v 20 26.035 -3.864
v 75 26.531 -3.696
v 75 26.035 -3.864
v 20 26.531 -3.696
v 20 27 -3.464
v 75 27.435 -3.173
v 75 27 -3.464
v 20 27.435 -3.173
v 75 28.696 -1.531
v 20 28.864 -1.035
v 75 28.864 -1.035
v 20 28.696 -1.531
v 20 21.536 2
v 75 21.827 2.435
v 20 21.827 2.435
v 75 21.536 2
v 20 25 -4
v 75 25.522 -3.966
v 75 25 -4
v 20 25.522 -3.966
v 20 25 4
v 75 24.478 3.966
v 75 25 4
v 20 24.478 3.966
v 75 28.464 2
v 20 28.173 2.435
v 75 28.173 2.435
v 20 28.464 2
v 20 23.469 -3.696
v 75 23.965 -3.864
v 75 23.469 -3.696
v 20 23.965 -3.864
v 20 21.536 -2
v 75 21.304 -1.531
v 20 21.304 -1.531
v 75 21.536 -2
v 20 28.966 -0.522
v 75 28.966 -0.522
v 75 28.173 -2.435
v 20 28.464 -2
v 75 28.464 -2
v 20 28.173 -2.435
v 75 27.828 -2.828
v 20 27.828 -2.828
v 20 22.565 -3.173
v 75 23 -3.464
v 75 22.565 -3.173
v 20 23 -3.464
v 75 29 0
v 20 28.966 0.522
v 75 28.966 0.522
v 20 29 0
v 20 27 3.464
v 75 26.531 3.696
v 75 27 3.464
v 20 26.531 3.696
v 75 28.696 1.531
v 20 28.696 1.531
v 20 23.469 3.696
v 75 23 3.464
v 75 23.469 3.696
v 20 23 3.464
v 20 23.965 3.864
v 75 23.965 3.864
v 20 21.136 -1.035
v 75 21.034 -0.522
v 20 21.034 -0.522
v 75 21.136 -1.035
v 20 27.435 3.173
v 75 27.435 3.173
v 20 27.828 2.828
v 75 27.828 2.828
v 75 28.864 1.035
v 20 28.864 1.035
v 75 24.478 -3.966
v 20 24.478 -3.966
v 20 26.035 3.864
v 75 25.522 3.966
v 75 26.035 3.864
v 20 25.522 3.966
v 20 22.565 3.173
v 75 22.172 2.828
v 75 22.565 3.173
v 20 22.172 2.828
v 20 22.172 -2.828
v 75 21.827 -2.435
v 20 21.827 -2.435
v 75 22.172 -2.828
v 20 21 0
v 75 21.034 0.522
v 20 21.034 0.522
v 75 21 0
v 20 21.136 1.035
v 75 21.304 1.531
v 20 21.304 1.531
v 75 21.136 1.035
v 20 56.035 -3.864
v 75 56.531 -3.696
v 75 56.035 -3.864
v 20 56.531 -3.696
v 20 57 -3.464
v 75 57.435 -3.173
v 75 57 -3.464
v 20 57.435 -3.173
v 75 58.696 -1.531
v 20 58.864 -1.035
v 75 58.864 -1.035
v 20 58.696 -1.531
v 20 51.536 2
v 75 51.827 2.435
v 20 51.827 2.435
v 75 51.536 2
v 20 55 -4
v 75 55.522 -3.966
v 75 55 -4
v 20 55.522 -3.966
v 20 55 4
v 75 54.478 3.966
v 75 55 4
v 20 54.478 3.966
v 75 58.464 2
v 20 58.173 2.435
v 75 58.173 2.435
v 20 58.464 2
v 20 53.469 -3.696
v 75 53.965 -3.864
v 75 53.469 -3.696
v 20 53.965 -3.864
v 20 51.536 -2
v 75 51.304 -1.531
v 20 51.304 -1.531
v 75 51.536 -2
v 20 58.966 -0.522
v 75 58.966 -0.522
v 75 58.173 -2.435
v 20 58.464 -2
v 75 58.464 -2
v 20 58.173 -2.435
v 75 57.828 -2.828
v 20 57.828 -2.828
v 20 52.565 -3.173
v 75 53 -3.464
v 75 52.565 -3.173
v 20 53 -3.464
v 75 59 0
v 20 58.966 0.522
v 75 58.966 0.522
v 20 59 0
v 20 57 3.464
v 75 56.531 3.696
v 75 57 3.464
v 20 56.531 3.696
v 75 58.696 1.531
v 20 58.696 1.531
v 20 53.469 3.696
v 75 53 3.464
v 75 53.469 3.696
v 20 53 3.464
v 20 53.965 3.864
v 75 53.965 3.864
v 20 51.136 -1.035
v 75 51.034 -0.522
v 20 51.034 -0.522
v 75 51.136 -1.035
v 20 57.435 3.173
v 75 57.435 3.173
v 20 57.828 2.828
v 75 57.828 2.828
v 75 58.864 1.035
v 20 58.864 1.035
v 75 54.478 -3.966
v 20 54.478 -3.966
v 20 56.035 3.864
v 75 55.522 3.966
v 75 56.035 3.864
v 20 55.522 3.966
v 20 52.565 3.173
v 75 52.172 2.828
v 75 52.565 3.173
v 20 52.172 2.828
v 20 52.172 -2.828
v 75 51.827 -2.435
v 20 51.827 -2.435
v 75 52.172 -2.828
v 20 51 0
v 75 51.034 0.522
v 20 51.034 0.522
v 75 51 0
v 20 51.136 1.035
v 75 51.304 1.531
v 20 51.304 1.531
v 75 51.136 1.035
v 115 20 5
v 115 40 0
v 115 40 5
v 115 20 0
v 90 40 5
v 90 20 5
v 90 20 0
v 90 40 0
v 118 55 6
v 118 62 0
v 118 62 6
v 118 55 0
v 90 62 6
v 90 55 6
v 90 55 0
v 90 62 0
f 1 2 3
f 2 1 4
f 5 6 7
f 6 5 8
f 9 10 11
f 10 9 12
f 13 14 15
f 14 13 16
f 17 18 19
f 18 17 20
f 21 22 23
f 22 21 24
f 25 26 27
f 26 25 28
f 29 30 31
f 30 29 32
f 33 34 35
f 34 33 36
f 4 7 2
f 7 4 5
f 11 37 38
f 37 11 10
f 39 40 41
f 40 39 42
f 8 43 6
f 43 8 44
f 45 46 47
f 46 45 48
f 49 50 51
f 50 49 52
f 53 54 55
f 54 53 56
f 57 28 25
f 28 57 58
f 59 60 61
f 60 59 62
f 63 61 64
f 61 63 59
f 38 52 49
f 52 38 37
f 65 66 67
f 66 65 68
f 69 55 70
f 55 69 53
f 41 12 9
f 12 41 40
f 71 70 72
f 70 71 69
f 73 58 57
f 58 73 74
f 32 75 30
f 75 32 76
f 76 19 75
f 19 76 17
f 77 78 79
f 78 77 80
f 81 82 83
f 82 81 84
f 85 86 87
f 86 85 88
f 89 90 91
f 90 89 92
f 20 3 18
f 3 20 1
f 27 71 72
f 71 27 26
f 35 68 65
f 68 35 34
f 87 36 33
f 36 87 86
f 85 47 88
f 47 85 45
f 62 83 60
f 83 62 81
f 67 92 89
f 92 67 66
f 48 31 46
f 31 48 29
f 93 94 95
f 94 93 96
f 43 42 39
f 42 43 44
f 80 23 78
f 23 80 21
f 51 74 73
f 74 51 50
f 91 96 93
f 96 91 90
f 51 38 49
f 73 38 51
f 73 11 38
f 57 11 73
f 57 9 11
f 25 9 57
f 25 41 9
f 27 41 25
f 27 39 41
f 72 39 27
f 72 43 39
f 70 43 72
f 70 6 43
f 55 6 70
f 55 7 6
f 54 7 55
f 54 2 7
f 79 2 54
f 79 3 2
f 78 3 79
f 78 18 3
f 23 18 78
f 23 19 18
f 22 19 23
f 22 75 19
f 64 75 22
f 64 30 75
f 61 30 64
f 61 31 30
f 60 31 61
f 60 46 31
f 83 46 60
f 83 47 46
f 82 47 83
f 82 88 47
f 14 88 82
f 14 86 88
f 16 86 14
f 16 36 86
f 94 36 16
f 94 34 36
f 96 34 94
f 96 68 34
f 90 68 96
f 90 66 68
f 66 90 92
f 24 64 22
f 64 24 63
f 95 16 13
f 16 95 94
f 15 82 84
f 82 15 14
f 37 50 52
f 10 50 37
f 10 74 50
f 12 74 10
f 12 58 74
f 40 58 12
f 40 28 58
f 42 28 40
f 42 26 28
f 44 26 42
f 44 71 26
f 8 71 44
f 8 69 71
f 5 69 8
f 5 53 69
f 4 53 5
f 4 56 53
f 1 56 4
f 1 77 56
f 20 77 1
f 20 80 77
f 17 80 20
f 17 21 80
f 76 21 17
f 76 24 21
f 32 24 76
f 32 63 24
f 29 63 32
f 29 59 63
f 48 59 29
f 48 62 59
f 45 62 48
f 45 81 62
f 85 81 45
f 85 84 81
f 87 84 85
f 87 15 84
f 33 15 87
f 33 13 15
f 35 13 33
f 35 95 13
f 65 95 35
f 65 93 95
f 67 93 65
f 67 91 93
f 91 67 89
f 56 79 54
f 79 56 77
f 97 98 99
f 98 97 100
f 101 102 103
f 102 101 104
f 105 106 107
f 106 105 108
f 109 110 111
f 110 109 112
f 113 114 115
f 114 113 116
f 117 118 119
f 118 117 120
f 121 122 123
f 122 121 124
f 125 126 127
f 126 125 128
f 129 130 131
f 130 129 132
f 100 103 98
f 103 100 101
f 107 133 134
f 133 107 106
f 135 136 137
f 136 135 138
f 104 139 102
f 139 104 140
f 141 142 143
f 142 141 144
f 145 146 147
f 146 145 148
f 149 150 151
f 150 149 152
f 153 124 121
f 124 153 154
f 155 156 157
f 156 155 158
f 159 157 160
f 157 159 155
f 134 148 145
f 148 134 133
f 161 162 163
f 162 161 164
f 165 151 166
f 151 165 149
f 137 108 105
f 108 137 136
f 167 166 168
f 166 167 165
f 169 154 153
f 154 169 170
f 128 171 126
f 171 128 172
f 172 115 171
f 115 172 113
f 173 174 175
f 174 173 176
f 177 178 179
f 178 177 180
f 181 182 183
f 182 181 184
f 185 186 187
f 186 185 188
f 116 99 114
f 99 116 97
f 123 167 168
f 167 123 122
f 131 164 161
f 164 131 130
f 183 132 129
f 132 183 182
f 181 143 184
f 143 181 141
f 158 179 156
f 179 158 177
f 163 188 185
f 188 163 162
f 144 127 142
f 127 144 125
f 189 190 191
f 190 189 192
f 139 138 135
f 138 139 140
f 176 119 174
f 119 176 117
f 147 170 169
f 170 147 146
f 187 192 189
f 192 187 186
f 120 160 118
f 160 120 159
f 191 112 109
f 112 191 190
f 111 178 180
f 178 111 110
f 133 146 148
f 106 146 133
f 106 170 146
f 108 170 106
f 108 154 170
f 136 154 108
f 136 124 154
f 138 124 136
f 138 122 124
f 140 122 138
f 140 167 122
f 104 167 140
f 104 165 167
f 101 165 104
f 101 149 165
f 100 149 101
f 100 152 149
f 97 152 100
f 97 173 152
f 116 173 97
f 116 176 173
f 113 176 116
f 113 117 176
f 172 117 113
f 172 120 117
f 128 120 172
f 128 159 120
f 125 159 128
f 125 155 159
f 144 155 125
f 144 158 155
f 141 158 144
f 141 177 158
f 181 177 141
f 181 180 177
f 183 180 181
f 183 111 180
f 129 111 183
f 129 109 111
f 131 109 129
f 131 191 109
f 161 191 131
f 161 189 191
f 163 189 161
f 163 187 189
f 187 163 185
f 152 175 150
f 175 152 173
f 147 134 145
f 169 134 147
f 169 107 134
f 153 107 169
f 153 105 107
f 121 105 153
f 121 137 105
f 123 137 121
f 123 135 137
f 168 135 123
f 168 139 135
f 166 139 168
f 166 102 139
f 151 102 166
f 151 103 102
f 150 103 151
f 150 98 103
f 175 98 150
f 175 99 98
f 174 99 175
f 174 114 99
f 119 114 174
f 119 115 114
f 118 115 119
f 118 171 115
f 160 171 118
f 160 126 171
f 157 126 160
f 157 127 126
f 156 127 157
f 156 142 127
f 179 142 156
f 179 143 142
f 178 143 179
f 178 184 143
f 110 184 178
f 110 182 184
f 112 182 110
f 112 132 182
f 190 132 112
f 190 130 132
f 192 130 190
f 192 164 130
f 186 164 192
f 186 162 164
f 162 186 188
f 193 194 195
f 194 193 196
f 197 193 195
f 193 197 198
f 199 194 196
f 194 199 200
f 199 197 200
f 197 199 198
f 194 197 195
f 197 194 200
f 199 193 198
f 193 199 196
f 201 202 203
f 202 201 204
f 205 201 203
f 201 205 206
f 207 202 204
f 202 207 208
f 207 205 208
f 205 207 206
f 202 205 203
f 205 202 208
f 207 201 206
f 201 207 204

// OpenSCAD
$fn=48;for(y=[25,55])color([.55,.55,.55])translate([20,y,0])rotate([0,90,0])cylinder(h=55,r=4);color([.05,.4,.3])translate([90,20,0])cube([25,20,5]);color([.95,.95,.95])translate([90,55,0])cube([28,7,6]);
